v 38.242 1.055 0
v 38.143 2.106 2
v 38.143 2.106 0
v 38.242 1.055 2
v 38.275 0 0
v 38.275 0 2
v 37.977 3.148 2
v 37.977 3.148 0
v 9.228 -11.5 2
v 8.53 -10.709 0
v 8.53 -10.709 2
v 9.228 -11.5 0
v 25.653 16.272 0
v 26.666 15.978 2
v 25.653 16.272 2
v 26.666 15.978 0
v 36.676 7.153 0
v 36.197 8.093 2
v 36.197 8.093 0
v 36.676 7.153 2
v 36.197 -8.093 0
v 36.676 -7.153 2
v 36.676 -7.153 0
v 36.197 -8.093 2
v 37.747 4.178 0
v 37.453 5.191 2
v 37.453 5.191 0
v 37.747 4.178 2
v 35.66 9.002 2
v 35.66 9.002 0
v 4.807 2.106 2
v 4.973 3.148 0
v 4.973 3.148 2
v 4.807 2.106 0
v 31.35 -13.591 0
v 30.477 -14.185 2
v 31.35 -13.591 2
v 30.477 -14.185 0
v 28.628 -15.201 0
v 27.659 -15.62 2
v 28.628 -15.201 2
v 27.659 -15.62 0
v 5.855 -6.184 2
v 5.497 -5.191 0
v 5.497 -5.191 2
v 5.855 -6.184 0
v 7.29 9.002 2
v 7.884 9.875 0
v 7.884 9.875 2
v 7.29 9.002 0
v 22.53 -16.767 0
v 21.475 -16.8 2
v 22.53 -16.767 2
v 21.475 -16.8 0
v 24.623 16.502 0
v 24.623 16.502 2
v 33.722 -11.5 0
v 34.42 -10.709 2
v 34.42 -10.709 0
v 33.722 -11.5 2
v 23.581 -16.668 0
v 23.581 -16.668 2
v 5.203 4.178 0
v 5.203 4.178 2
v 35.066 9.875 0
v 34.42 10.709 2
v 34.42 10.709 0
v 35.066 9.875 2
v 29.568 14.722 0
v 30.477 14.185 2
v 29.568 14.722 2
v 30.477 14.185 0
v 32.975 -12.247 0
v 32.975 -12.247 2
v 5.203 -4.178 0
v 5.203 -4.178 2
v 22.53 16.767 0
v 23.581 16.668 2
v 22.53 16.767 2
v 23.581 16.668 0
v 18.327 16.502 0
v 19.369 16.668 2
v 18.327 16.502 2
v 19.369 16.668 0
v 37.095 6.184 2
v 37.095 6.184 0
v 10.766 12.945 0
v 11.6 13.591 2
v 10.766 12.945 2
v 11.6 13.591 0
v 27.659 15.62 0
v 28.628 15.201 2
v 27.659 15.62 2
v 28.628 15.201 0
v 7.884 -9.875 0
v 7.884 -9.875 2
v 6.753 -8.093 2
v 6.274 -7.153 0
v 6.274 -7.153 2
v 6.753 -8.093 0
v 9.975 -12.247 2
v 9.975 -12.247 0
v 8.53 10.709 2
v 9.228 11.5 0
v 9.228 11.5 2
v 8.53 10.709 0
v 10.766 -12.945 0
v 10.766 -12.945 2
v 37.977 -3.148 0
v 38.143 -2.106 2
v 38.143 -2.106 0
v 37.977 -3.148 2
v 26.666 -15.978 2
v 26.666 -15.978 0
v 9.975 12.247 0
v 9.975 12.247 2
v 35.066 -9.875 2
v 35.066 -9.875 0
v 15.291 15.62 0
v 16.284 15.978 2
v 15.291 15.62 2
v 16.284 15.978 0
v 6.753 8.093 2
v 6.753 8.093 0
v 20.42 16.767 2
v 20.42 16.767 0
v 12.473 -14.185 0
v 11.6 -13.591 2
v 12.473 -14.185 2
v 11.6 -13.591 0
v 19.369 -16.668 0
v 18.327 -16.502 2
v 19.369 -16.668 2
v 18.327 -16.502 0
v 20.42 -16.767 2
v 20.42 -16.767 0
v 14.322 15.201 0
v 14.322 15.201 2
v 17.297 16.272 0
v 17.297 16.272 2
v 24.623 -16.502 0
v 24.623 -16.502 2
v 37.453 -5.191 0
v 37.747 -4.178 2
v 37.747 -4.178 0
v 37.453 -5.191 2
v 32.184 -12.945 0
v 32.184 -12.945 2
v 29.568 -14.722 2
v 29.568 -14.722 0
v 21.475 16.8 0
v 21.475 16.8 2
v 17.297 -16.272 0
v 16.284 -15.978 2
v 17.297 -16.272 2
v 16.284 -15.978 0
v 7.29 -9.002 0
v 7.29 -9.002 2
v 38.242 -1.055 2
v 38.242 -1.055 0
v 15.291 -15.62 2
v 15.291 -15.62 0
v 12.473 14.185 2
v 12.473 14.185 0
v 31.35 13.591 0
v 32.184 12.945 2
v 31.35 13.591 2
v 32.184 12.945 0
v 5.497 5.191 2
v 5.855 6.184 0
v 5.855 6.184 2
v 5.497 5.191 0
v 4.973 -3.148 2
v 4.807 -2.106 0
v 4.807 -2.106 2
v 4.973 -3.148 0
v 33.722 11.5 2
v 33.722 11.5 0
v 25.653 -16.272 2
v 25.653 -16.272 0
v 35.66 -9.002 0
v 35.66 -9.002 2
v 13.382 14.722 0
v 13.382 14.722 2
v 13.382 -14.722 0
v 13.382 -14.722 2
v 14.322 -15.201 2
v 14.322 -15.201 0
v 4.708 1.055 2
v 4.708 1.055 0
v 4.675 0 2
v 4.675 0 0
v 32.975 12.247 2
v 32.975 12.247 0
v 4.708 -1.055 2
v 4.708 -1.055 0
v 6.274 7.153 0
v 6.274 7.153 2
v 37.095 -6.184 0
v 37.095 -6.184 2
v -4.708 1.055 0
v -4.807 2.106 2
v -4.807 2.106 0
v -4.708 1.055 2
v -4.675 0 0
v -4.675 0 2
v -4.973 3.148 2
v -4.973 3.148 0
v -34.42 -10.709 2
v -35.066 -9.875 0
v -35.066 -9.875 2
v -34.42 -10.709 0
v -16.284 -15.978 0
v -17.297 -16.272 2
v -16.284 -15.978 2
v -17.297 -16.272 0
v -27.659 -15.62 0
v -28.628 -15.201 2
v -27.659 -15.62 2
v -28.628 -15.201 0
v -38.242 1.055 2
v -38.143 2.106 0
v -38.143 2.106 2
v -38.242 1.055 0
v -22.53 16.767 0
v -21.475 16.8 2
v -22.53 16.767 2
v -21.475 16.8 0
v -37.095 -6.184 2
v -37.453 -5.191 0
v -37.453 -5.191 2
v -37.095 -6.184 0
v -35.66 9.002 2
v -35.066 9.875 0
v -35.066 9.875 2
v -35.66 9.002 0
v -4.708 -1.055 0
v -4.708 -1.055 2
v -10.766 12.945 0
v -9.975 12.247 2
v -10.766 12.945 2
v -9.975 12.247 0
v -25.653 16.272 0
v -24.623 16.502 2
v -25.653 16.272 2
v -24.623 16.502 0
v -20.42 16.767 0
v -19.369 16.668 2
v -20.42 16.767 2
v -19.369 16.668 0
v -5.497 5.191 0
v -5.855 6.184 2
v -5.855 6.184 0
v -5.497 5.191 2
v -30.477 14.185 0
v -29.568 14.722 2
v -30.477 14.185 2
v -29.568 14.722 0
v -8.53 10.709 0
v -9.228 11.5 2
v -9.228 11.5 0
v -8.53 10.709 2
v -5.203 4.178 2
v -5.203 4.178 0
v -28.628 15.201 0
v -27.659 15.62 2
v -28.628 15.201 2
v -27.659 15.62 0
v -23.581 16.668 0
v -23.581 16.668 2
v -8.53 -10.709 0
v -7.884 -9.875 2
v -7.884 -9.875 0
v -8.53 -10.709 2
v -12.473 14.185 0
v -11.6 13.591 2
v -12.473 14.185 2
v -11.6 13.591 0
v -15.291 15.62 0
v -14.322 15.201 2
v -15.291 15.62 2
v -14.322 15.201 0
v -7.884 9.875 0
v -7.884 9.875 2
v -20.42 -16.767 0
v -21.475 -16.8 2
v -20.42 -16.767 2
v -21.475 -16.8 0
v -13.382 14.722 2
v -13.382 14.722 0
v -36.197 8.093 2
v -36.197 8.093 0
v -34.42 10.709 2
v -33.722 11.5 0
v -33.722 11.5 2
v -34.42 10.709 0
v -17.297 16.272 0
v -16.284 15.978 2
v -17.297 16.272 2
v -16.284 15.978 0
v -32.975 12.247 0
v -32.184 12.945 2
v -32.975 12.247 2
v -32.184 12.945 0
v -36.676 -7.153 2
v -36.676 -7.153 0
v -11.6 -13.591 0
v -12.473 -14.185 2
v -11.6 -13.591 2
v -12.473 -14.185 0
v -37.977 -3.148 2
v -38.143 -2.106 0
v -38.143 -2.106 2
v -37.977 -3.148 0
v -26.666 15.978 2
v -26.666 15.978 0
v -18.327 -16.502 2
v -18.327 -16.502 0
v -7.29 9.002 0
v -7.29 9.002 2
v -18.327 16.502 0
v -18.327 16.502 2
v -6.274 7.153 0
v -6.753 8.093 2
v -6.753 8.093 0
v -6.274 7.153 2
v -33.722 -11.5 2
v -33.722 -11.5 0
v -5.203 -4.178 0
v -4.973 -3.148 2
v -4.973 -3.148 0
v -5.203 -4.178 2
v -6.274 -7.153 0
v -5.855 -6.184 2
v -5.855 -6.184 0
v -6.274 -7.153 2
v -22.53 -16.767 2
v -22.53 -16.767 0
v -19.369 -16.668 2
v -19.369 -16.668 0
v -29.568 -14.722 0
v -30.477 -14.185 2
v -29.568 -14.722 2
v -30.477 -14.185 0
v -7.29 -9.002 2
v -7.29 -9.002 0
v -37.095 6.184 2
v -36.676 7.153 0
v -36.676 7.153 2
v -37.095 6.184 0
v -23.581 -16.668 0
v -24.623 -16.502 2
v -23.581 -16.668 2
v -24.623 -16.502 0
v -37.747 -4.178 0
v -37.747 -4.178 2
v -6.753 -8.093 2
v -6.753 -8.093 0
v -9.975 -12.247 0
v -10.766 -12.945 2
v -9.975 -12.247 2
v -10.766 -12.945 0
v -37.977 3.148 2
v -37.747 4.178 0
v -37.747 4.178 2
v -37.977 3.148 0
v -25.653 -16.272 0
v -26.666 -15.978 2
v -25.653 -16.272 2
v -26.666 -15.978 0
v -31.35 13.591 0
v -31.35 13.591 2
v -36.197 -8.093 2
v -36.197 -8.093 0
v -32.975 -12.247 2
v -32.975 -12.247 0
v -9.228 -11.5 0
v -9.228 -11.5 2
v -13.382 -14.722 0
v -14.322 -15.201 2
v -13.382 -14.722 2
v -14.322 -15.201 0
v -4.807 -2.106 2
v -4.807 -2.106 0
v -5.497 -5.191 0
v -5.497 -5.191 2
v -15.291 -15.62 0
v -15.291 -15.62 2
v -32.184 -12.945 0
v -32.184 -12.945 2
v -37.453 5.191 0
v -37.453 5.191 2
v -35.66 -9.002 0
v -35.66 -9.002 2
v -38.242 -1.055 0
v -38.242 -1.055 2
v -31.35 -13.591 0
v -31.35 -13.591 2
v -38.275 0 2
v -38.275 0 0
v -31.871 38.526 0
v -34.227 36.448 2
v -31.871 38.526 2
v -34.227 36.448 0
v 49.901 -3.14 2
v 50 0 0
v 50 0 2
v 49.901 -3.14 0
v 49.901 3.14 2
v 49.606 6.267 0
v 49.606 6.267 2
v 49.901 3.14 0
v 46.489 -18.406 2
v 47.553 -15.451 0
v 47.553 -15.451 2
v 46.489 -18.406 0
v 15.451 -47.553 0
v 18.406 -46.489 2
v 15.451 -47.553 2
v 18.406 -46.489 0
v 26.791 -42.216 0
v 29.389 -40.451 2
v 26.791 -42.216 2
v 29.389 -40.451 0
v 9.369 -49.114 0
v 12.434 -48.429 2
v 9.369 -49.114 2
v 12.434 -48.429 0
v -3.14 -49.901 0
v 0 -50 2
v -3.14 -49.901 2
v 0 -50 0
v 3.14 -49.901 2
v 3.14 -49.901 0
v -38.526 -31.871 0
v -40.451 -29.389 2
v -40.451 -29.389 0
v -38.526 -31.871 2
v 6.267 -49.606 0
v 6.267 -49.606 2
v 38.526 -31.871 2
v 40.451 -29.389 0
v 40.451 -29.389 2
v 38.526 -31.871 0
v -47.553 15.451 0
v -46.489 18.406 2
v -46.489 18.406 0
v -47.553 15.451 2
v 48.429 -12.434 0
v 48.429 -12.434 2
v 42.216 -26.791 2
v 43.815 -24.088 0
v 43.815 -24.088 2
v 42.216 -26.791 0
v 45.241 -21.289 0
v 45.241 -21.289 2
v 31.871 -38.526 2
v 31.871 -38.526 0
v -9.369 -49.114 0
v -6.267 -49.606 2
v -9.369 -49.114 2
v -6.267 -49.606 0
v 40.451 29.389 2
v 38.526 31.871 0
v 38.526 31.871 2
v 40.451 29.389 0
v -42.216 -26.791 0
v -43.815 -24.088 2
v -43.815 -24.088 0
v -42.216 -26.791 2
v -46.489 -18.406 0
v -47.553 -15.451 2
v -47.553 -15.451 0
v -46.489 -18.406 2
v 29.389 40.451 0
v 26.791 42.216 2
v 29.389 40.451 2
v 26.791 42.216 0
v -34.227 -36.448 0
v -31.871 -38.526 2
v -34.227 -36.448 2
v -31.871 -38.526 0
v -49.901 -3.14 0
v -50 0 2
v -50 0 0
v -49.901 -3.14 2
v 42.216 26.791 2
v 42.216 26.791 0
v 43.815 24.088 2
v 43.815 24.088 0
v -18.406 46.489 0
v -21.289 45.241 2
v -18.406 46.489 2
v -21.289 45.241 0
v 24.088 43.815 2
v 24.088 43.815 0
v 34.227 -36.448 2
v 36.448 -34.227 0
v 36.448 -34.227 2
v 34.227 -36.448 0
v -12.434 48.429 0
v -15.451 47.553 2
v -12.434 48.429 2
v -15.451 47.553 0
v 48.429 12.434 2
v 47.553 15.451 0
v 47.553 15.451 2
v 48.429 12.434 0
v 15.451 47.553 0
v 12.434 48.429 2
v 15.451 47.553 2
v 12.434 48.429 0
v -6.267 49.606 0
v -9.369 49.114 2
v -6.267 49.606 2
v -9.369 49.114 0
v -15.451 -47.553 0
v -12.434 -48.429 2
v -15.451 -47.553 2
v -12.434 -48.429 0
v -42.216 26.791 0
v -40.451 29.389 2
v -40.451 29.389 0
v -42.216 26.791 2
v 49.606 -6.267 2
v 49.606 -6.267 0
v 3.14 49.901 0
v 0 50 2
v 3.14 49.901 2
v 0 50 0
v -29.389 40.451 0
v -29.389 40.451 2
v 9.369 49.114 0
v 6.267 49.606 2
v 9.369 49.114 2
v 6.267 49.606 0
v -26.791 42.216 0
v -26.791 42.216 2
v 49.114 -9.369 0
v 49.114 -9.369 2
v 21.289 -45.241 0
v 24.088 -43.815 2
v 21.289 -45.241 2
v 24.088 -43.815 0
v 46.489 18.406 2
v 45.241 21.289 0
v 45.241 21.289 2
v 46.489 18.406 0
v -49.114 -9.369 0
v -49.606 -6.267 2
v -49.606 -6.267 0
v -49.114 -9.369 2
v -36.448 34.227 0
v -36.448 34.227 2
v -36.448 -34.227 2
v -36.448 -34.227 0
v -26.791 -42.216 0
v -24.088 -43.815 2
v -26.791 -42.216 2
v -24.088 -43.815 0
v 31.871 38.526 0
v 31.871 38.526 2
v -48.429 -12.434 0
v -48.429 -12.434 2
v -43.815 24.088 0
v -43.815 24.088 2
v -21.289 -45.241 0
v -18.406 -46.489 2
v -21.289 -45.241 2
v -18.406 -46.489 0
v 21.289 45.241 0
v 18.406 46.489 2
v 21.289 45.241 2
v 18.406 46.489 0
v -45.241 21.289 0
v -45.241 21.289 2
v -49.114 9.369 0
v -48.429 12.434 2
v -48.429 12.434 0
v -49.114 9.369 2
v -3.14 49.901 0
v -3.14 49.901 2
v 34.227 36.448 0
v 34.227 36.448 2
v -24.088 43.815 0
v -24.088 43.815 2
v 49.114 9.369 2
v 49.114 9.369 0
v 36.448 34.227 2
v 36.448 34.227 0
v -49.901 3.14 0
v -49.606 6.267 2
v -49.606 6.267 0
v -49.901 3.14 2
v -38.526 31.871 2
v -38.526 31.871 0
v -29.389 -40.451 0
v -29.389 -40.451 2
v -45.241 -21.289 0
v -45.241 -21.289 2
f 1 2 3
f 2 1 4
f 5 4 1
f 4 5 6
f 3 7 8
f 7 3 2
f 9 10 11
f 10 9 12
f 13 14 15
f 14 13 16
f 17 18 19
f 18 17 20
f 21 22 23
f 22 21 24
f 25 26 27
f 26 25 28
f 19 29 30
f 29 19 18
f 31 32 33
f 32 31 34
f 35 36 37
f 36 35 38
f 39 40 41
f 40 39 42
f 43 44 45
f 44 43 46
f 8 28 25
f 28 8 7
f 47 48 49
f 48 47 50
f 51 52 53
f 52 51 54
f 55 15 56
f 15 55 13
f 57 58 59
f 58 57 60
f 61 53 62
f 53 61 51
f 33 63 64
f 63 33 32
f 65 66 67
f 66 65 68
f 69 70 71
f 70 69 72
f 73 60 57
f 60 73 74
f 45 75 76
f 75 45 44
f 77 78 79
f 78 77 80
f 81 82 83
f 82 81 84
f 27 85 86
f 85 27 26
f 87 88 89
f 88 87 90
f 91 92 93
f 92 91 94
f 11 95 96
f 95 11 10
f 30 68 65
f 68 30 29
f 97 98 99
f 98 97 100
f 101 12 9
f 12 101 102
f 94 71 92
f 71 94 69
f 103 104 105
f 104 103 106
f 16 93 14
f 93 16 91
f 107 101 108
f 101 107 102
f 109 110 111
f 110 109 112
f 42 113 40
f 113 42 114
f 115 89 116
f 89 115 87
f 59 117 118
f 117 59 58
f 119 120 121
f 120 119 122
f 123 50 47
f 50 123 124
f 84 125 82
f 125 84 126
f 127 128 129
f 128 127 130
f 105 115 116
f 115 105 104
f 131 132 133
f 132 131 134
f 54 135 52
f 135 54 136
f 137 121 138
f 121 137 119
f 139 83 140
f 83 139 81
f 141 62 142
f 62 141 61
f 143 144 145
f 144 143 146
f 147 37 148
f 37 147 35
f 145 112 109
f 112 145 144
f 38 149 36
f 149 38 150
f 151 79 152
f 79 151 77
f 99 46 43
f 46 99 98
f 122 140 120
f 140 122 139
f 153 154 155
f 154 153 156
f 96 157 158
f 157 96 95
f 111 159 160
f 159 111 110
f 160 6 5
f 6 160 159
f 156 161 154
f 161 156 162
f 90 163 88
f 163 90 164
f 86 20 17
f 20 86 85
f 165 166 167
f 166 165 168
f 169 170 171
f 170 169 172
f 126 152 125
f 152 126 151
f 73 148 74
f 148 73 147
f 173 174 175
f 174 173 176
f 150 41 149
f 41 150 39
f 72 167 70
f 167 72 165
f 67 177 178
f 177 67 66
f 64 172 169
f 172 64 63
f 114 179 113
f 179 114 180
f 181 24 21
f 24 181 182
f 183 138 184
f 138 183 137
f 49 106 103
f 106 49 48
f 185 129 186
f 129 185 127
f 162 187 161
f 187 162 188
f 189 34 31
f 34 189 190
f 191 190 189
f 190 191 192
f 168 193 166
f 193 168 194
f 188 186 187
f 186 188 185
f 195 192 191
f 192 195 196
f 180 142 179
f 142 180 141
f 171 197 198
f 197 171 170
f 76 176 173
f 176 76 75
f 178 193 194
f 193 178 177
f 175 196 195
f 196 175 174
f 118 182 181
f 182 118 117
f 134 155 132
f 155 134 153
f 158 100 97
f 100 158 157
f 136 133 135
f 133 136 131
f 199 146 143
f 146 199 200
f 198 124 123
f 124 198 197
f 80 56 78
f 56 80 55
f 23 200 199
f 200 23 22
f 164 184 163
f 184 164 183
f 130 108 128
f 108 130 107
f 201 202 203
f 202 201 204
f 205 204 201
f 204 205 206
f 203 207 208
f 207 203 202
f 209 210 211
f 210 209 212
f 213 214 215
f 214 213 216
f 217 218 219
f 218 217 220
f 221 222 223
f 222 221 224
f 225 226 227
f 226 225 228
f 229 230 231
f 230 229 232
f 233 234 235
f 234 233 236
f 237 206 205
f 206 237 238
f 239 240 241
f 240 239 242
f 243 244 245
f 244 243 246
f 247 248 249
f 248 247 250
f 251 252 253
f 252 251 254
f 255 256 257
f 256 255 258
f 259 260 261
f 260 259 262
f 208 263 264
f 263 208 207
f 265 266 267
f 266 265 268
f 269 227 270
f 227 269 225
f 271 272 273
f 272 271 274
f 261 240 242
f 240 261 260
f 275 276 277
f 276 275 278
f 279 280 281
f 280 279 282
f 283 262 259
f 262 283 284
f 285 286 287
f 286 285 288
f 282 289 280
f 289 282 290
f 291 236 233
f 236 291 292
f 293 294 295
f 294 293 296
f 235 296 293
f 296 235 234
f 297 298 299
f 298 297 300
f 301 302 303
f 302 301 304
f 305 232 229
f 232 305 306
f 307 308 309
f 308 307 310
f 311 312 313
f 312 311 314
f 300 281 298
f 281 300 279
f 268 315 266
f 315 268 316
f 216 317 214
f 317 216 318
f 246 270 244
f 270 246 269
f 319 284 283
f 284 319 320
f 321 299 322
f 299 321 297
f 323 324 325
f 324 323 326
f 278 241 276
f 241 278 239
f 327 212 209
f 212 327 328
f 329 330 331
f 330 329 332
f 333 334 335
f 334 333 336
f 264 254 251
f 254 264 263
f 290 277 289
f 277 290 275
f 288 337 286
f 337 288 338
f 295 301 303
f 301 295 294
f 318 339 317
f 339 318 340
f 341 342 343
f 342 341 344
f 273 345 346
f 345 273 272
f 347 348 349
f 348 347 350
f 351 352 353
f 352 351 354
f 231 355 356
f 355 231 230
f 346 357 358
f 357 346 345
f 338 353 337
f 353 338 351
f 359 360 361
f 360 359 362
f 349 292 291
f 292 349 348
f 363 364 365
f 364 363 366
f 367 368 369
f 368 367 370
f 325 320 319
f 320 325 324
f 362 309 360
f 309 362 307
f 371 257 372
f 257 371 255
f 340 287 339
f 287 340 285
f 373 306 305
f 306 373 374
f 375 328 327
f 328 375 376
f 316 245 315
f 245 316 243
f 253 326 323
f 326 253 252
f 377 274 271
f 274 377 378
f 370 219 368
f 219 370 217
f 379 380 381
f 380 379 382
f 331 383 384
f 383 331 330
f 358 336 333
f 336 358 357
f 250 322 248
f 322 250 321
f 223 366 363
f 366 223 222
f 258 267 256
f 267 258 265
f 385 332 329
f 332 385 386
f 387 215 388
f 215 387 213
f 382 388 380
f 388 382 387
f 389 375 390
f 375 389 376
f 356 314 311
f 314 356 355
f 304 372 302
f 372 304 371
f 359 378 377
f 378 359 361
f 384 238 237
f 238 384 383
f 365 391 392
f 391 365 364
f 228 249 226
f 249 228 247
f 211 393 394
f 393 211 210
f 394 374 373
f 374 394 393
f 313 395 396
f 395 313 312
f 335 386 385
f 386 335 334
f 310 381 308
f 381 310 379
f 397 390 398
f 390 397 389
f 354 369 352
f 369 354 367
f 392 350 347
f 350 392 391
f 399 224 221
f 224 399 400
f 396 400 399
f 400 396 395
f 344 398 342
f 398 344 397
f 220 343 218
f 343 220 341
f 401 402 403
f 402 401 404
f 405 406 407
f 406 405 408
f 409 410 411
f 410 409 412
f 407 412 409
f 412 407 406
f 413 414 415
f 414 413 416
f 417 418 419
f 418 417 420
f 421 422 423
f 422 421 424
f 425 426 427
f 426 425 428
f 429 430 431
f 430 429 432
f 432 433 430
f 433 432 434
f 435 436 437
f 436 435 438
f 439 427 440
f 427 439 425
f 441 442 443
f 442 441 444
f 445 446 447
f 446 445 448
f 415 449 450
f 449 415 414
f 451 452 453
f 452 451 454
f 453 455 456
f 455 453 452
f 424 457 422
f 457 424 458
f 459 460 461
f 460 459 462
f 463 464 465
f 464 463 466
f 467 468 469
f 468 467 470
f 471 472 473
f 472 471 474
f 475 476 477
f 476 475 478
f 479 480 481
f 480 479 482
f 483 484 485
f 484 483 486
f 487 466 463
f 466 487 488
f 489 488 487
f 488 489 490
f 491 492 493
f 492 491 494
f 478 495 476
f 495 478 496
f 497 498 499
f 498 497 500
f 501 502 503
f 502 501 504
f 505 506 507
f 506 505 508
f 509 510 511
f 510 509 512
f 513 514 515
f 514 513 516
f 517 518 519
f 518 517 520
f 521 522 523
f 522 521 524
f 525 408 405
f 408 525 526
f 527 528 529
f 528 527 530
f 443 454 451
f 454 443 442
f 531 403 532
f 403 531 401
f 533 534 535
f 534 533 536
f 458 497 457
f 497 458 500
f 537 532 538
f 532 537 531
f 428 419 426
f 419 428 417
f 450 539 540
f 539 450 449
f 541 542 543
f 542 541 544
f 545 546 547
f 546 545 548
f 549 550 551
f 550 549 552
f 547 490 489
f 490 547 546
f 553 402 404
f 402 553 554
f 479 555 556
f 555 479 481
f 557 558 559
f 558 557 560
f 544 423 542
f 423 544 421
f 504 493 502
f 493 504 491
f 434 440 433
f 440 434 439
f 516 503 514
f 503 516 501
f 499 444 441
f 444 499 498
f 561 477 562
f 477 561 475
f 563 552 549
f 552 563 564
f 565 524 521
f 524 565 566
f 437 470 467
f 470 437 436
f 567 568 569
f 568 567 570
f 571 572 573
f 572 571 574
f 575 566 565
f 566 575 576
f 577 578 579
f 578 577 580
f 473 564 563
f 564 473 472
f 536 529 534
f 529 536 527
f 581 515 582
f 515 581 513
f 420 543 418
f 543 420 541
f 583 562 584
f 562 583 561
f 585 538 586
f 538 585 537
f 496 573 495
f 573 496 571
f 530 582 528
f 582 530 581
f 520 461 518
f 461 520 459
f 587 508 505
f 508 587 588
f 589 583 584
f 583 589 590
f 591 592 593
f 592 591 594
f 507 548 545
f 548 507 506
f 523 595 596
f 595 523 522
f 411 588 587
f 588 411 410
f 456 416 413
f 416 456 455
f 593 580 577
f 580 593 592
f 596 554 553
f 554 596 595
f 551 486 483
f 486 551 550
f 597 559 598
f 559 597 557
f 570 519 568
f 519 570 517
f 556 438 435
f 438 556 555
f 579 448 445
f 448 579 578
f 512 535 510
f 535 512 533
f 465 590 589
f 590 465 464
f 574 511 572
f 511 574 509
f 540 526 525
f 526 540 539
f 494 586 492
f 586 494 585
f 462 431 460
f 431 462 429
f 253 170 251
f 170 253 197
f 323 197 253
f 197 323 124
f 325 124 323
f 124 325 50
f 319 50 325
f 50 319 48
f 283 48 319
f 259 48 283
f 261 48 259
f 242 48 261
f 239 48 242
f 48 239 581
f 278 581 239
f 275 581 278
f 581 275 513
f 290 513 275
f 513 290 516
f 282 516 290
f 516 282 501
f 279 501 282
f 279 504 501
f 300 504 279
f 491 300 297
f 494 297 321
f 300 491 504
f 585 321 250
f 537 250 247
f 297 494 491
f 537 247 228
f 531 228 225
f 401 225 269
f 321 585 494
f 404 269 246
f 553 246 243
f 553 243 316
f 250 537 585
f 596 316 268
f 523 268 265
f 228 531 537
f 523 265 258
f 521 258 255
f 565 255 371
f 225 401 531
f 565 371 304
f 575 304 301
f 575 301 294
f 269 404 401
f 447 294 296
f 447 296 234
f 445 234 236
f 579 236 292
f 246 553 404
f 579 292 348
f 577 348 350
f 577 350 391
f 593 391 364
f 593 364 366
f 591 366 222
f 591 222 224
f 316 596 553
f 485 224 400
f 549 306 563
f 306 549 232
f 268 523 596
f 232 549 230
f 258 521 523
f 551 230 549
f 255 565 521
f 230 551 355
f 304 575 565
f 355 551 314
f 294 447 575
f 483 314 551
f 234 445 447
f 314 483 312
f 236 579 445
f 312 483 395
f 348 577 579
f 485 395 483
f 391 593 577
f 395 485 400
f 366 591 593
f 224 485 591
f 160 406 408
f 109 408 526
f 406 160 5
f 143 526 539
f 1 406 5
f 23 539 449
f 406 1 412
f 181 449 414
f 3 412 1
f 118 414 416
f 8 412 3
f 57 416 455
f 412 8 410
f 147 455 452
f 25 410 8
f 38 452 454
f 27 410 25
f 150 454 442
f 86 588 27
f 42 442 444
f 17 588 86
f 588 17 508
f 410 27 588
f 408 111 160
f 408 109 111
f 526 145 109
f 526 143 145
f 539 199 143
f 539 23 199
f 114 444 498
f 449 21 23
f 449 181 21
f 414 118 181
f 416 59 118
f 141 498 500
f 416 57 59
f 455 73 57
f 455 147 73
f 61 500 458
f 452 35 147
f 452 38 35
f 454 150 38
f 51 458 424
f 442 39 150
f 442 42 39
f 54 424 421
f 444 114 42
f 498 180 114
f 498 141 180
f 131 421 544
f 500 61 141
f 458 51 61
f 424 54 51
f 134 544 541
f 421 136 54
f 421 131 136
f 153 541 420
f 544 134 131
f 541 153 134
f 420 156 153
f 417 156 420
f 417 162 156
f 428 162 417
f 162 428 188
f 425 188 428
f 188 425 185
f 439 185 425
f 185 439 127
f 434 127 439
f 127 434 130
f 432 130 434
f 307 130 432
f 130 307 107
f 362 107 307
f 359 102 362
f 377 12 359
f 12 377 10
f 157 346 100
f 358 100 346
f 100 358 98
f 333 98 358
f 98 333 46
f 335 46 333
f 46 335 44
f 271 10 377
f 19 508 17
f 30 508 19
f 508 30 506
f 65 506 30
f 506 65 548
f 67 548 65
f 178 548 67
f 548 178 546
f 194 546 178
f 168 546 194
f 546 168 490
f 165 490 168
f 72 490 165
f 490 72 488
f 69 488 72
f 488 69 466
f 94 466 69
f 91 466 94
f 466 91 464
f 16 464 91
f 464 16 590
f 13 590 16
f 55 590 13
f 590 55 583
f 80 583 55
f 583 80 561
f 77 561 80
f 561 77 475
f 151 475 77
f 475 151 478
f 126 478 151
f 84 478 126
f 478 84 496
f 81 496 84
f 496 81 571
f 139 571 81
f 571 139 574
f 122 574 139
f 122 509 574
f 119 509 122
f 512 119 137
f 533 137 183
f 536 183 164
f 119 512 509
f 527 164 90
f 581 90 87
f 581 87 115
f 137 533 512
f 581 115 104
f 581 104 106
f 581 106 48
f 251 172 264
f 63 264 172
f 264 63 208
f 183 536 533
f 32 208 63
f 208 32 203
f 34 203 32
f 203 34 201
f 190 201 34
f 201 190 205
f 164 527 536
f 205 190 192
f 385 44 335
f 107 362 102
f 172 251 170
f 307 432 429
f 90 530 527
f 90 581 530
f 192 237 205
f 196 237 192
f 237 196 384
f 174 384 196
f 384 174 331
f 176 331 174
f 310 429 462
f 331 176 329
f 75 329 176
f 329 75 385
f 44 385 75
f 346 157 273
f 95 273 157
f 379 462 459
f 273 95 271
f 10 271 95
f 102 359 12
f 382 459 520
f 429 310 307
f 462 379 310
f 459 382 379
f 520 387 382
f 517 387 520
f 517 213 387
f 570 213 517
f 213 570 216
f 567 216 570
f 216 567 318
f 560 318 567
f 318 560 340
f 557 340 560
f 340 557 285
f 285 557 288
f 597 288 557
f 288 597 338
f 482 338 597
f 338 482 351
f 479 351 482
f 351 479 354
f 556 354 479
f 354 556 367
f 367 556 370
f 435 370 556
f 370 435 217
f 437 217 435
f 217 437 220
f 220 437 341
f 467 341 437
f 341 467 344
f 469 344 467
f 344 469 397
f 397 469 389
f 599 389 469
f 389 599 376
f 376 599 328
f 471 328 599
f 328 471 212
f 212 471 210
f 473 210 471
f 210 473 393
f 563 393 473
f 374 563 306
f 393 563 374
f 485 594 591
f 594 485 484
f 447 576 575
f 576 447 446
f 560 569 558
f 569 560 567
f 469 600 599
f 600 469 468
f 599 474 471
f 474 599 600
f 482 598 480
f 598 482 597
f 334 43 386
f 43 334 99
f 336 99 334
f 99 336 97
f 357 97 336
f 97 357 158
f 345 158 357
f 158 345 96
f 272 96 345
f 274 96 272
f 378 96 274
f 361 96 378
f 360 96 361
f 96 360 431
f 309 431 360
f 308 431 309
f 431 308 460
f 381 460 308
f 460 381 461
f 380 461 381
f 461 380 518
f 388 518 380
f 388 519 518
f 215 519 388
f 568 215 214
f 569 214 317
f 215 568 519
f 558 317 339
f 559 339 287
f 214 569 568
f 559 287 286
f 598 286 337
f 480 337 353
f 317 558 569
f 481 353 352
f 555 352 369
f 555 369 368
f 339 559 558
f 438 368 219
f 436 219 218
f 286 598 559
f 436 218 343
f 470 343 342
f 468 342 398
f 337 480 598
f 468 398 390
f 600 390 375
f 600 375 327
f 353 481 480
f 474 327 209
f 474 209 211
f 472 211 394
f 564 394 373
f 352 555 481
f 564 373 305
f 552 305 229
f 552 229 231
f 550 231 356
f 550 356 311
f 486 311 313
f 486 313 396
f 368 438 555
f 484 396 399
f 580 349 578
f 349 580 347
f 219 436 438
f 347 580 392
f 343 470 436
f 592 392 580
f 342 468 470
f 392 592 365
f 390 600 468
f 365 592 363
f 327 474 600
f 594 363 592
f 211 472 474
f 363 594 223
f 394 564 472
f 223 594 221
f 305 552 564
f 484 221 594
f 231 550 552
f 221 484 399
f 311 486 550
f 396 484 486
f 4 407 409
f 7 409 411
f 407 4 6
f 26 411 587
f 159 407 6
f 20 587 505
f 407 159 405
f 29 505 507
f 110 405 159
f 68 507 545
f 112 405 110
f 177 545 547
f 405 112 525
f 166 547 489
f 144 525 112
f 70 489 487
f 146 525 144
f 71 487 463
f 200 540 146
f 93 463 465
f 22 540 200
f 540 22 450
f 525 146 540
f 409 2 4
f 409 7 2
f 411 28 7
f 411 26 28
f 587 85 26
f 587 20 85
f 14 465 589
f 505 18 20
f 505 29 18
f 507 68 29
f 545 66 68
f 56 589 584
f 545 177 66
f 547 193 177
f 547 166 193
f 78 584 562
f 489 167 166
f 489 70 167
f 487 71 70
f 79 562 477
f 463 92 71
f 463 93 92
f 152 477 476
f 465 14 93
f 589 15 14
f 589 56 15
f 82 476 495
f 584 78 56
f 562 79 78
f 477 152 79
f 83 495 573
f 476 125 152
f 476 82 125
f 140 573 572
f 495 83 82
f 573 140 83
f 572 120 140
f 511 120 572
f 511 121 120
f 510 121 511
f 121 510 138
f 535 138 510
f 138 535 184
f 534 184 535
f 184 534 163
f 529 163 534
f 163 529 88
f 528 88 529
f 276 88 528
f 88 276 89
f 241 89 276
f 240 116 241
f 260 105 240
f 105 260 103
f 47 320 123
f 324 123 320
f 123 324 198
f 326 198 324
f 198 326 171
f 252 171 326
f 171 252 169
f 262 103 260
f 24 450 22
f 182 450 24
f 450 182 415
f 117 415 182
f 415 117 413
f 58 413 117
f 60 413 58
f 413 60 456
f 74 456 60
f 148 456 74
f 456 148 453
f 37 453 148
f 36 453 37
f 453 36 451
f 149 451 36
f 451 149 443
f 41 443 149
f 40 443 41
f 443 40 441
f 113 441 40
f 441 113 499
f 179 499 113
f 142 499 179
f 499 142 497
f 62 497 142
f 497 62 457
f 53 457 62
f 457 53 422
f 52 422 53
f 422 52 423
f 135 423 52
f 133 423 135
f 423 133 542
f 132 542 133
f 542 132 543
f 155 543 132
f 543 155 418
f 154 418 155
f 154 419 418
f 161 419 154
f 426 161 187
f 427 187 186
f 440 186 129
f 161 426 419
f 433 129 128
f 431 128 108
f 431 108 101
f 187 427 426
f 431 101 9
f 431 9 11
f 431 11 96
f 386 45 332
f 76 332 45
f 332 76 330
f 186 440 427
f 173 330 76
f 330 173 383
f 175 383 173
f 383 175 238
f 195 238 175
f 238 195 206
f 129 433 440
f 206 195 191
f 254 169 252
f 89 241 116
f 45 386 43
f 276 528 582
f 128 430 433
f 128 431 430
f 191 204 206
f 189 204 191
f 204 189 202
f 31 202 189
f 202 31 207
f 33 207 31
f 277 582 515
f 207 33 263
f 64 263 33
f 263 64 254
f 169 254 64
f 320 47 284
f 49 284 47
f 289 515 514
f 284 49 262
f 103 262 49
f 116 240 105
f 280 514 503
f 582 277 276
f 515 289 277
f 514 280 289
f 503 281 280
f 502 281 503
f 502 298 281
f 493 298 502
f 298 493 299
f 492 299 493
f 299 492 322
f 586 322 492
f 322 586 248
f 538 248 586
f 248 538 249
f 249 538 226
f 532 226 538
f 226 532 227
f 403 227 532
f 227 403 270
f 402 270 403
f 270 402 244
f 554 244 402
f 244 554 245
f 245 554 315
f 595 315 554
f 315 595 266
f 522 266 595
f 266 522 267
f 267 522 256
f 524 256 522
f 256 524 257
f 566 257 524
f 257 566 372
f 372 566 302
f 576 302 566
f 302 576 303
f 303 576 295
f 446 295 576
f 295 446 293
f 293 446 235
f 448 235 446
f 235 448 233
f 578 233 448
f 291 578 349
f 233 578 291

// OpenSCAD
$fn=100;
radius_fudge_factor=0.4*2;

sensor_r=16+radius_fudge_factor;
cap_r=2*25;

heights=1*25;

sensor_gap=9.35+2*sensor_r;

intersection(){
	difference(){
		cylinder(r=cap_r, h=heights);
		union(){
			translate([sensor_gap/2,0,-1])
				cylinder(r=sensor_r, h=heights+2);
			translate([-sensor_gap/2,0,-1])
				cylinder(r=sensor_r, h=heights+2);
		}
	}
	cylinder(r=cap_r, h=2);
}
